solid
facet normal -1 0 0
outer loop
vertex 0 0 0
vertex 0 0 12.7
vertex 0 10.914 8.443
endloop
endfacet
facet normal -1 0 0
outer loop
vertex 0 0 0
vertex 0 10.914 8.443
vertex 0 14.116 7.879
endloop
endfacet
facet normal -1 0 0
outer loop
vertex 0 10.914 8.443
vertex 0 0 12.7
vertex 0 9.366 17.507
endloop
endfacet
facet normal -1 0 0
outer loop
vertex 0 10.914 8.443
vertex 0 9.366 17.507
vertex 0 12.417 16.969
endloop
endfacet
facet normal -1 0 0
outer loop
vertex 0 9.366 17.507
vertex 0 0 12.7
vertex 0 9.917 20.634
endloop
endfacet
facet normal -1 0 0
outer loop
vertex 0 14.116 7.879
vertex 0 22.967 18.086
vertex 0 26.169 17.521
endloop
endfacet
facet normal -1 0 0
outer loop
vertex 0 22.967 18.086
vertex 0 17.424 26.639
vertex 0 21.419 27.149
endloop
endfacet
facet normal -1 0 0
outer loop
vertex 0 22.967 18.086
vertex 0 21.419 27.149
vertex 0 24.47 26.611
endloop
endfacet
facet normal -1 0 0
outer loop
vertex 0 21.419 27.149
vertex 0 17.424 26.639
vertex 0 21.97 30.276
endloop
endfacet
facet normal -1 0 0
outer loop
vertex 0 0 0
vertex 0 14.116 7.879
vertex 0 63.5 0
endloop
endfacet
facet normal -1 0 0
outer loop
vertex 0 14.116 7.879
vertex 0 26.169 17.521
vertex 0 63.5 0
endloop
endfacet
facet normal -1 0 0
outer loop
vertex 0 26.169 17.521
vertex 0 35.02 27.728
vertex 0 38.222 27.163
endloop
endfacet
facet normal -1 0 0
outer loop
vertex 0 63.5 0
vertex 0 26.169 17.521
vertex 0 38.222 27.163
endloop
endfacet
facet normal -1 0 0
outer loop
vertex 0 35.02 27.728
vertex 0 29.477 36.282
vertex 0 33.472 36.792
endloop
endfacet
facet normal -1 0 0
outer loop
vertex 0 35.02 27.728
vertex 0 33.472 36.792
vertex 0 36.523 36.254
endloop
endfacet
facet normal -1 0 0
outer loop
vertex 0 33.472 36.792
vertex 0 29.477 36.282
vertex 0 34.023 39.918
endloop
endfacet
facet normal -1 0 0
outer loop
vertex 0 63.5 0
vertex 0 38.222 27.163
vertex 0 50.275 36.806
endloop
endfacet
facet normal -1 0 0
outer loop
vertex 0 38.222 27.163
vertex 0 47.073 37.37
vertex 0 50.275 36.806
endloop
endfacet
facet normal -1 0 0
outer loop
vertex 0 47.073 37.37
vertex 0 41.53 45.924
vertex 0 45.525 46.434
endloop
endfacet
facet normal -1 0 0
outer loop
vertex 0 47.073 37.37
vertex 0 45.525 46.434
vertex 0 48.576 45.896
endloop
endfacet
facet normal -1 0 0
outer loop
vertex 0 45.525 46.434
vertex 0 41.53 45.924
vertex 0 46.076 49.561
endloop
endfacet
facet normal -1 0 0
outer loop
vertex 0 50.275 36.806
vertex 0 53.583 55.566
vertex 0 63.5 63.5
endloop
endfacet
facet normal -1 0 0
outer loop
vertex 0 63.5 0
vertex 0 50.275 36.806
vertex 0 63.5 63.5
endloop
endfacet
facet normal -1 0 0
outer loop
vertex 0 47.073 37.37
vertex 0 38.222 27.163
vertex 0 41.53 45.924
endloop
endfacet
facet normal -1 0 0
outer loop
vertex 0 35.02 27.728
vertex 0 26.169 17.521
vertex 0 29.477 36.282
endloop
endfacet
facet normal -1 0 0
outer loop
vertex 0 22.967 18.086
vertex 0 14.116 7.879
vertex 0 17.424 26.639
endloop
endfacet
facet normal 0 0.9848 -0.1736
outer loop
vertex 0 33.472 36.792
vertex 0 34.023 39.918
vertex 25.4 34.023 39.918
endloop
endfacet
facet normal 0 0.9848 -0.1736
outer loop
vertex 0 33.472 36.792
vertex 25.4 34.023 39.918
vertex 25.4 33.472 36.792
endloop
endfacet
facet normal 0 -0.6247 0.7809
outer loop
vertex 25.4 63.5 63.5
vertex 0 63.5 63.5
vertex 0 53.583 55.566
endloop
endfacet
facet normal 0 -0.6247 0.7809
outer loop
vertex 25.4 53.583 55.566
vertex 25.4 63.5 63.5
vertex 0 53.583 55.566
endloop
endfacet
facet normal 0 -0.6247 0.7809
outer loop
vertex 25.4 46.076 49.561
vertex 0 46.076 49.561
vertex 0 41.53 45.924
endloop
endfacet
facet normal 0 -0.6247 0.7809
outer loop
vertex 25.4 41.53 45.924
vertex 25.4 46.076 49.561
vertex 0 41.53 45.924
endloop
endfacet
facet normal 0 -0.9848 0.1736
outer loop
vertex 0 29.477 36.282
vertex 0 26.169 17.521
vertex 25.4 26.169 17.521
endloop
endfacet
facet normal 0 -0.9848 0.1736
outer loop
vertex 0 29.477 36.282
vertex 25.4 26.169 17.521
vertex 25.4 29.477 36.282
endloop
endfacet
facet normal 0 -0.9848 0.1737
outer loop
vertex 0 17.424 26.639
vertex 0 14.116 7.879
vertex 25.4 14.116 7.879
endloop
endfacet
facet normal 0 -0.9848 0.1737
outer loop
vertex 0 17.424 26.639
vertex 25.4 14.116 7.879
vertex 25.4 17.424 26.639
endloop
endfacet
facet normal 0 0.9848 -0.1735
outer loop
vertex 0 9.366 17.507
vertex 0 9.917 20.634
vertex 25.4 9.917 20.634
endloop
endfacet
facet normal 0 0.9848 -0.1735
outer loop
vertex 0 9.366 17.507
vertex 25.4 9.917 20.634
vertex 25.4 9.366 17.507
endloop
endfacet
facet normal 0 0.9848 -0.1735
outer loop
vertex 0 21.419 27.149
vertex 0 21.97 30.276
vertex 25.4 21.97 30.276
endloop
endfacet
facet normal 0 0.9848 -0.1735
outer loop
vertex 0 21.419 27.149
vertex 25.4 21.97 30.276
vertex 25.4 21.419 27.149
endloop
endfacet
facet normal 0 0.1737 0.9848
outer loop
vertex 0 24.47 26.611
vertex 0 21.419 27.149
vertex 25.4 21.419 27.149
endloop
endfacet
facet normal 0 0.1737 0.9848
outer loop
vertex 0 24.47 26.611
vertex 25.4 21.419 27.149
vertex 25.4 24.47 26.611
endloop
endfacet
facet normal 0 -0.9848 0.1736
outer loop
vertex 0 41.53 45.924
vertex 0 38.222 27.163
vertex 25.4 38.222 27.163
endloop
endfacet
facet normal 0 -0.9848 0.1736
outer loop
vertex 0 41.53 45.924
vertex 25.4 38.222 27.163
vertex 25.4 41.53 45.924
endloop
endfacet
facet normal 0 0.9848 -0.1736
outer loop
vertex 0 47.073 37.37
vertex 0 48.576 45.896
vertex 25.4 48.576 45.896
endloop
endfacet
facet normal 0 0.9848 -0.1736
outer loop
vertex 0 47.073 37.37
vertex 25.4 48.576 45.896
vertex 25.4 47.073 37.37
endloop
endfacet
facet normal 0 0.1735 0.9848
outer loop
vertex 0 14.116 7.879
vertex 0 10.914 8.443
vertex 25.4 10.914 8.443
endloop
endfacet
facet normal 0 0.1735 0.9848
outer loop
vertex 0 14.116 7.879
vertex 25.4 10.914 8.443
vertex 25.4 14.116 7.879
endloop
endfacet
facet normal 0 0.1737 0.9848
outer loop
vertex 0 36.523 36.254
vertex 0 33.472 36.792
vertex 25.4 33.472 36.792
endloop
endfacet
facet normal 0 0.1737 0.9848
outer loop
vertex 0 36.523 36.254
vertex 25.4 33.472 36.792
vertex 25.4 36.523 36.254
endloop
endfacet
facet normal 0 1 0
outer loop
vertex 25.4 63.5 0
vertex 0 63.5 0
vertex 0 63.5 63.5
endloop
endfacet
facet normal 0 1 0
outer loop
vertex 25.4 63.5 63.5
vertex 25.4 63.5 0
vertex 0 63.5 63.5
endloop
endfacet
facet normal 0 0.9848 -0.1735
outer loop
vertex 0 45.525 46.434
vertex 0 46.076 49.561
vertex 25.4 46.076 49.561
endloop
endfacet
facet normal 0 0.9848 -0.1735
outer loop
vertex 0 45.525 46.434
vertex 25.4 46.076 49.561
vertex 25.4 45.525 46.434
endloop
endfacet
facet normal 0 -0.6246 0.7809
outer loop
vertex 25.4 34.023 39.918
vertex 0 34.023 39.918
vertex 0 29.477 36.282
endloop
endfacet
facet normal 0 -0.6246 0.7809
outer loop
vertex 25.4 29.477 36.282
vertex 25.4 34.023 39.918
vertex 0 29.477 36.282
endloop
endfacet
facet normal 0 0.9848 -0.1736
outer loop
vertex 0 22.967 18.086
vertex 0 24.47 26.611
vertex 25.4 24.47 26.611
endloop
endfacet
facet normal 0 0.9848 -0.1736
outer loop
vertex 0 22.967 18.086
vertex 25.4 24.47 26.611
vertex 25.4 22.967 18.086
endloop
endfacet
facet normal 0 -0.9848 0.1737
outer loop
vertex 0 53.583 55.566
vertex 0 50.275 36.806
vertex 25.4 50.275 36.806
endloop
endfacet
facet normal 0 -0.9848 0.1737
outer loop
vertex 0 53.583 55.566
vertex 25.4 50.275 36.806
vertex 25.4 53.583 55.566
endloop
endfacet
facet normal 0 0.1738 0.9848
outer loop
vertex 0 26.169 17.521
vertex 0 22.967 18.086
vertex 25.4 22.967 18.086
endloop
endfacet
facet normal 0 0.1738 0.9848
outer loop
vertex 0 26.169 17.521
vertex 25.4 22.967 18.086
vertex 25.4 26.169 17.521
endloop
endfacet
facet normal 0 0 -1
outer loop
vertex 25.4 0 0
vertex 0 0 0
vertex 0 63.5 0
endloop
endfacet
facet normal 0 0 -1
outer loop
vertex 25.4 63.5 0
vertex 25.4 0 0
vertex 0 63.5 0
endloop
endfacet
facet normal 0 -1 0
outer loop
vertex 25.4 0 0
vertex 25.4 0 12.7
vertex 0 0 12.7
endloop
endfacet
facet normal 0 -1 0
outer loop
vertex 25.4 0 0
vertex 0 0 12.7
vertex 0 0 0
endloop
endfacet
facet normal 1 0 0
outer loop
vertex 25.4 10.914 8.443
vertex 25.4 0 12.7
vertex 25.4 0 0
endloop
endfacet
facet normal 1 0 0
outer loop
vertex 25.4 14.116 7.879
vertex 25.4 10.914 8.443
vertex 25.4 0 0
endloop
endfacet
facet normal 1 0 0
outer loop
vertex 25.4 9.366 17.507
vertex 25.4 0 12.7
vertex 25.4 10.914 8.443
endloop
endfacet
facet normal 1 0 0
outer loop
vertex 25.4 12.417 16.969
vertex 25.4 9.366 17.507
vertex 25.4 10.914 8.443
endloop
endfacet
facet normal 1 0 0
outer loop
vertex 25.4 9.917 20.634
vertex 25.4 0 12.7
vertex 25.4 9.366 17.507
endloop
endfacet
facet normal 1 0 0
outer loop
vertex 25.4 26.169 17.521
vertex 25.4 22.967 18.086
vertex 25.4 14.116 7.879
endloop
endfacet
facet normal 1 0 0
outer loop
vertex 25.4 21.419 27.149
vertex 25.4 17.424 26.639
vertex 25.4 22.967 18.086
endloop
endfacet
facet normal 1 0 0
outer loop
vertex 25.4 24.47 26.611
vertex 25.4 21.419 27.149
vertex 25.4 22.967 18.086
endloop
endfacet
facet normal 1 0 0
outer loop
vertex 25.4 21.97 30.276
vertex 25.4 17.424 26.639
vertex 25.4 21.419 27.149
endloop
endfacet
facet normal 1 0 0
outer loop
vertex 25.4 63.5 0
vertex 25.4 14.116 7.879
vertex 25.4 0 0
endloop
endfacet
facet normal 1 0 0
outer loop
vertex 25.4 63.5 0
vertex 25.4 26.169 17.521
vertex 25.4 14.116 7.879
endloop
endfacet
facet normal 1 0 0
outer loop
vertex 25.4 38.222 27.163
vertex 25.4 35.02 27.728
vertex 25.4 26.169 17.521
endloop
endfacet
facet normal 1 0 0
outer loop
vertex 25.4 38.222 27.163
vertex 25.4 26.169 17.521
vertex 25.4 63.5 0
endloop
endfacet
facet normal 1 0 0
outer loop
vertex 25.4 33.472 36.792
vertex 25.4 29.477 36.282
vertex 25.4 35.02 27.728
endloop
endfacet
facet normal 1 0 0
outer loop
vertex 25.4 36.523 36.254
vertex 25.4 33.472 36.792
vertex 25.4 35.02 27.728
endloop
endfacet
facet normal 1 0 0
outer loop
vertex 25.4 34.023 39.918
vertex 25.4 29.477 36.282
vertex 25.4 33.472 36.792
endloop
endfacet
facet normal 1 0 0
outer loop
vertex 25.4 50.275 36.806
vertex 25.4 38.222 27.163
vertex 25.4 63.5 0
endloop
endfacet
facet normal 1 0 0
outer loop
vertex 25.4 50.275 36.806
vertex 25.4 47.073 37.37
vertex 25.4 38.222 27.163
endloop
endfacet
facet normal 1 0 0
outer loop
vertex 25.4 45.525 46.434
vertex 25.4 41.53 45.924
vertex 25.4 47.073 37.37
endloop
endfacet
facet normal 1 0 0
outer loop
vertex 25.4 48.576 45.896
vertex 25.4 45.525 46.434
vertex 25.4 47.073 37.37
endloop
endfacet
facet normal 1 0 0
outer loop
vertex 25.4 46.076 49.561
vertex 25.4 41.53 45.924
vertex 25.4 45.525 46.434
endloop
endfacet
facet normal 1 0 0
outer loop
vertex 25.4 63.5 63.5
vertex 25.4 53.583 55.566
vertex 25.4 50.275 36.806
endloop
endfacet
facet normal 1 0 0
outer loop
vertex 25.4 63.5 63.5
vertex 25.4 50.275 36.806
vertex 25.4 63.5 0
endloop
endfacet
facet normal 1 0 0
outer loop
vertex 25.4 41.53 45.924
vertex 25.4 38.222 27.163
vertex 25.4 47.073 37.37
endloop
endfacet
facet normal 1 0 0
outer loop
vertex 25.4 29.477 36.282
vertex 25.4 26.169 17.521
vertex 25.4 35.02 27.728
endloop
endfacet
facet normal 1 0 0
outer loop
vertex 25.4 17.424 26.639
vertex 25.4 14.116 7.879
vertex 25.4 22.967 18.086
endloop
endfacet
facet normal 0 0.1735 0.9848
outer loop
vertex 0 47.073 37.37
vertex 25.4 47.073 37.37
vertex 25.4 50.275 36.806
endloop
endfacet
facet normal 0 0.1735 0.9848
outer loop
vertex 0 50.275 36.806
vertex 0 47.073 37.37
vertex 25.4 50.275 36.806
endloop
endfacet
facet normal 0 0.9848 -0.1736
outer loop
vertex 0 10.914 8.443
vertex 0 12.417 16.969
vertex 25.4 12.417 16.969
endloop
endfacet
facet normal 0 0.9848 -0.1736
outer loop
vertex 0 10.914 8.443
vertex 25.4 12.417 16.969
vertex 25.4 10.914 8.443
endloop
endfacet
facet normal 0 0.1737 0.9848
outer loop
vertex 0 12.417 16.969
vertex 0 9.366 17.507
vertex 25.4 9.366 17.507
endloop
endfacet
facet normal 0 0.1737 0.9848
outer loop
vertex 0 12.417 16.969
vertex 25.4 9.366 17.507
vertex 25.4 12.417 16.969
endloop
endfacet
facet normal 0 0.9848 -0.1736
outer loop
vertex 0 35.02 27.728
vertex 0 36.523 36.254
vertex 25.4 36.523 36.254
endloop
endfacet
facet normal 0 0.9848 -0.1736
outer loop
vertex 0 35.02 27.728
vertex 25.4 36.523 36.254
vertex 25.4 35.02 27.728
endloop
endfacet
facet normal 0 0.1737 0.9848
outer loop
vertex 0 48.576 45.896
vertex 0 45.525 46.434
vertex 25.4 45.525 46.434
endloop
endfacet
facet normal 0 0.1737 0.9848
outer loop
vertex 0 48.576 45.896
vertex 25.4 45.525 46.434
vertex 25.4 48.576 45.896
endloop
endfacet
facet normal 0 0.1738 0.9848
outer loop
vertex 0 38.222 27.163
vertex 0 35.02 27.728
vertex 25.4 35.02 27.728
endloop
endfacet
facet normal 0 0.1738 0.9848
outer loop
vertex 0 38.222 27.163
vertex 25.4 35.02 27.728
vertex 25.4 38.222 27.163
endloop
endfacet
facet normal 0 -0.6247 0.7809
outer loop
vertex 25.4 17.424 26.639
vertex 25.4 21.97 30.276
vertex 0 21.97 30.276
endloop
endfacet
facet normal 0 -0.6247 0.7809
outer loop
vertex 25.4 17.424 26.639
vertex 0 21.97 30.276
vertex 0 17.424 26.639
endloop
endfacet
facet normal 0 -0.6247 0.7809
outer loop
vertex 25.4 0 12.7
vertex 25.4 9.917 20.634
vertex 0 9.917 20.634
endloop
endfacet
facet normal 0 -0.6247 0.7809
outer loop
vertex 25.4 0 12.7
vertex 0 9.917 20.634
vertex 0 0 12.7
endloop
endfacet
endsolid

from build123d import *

# Parameters (mm, degrees)
F2_DEPTH = 25.4
F3_DEPTH = 25.4


with BuildPart() as f2:
    # F0 (on Right) → F2 (new body)
    with BuildSketch(Plane.YZ):
        Polygon((0, 12.7), (0, 0), (63.5, 0), (63.5, 63.5), align=None)
    extrude(amount=F2_DEPTH)

    # F1 (on Right) → F3 (cut)
    with BuildSketch(Plane.YZ):
        Polygon((17.4239271212, 26.6391416969), (9.9170338799, 20.6336271039), (9.3657009158, 17.5068624881), (12.4174231809, 16.9687615152), (10.91412237, 8.4431189573), (14.1159293366, 7.8785540021), align=None)
        Polygon((29.4769401208, 36.2815520967), (21.9700468796, 30.2760375036), (21.4187139155, 27.1492728878), (24.4704361805, 26.6111719149), (22.9671353697, 18.085529357), (26.1689423363, 17.5209644018), align=None)
        Polygon((41.5299531204, 45.9239624964), (34.0230598792, 39.9184479033), (33.4717269151, 36.7916832875), (36.5234491801, 36.2535823146), (35.0201483693, 27.7279397567), (38.2219553359, 27.1633748015), align=None)
        Polygon((53.5829661201, 55.5663728961), (46.0760728788, 49.5608583031), (45.5247399147, 46.4340936872), (48.5764621798, 45.8959927143), (47.0731613689, 37.3703501564), (50.2749683355, 36.8057852012), align=None)
    extrude(amount=F3_DEPTH, mode=Mode.SUBTRACT)


solid = f2.part
